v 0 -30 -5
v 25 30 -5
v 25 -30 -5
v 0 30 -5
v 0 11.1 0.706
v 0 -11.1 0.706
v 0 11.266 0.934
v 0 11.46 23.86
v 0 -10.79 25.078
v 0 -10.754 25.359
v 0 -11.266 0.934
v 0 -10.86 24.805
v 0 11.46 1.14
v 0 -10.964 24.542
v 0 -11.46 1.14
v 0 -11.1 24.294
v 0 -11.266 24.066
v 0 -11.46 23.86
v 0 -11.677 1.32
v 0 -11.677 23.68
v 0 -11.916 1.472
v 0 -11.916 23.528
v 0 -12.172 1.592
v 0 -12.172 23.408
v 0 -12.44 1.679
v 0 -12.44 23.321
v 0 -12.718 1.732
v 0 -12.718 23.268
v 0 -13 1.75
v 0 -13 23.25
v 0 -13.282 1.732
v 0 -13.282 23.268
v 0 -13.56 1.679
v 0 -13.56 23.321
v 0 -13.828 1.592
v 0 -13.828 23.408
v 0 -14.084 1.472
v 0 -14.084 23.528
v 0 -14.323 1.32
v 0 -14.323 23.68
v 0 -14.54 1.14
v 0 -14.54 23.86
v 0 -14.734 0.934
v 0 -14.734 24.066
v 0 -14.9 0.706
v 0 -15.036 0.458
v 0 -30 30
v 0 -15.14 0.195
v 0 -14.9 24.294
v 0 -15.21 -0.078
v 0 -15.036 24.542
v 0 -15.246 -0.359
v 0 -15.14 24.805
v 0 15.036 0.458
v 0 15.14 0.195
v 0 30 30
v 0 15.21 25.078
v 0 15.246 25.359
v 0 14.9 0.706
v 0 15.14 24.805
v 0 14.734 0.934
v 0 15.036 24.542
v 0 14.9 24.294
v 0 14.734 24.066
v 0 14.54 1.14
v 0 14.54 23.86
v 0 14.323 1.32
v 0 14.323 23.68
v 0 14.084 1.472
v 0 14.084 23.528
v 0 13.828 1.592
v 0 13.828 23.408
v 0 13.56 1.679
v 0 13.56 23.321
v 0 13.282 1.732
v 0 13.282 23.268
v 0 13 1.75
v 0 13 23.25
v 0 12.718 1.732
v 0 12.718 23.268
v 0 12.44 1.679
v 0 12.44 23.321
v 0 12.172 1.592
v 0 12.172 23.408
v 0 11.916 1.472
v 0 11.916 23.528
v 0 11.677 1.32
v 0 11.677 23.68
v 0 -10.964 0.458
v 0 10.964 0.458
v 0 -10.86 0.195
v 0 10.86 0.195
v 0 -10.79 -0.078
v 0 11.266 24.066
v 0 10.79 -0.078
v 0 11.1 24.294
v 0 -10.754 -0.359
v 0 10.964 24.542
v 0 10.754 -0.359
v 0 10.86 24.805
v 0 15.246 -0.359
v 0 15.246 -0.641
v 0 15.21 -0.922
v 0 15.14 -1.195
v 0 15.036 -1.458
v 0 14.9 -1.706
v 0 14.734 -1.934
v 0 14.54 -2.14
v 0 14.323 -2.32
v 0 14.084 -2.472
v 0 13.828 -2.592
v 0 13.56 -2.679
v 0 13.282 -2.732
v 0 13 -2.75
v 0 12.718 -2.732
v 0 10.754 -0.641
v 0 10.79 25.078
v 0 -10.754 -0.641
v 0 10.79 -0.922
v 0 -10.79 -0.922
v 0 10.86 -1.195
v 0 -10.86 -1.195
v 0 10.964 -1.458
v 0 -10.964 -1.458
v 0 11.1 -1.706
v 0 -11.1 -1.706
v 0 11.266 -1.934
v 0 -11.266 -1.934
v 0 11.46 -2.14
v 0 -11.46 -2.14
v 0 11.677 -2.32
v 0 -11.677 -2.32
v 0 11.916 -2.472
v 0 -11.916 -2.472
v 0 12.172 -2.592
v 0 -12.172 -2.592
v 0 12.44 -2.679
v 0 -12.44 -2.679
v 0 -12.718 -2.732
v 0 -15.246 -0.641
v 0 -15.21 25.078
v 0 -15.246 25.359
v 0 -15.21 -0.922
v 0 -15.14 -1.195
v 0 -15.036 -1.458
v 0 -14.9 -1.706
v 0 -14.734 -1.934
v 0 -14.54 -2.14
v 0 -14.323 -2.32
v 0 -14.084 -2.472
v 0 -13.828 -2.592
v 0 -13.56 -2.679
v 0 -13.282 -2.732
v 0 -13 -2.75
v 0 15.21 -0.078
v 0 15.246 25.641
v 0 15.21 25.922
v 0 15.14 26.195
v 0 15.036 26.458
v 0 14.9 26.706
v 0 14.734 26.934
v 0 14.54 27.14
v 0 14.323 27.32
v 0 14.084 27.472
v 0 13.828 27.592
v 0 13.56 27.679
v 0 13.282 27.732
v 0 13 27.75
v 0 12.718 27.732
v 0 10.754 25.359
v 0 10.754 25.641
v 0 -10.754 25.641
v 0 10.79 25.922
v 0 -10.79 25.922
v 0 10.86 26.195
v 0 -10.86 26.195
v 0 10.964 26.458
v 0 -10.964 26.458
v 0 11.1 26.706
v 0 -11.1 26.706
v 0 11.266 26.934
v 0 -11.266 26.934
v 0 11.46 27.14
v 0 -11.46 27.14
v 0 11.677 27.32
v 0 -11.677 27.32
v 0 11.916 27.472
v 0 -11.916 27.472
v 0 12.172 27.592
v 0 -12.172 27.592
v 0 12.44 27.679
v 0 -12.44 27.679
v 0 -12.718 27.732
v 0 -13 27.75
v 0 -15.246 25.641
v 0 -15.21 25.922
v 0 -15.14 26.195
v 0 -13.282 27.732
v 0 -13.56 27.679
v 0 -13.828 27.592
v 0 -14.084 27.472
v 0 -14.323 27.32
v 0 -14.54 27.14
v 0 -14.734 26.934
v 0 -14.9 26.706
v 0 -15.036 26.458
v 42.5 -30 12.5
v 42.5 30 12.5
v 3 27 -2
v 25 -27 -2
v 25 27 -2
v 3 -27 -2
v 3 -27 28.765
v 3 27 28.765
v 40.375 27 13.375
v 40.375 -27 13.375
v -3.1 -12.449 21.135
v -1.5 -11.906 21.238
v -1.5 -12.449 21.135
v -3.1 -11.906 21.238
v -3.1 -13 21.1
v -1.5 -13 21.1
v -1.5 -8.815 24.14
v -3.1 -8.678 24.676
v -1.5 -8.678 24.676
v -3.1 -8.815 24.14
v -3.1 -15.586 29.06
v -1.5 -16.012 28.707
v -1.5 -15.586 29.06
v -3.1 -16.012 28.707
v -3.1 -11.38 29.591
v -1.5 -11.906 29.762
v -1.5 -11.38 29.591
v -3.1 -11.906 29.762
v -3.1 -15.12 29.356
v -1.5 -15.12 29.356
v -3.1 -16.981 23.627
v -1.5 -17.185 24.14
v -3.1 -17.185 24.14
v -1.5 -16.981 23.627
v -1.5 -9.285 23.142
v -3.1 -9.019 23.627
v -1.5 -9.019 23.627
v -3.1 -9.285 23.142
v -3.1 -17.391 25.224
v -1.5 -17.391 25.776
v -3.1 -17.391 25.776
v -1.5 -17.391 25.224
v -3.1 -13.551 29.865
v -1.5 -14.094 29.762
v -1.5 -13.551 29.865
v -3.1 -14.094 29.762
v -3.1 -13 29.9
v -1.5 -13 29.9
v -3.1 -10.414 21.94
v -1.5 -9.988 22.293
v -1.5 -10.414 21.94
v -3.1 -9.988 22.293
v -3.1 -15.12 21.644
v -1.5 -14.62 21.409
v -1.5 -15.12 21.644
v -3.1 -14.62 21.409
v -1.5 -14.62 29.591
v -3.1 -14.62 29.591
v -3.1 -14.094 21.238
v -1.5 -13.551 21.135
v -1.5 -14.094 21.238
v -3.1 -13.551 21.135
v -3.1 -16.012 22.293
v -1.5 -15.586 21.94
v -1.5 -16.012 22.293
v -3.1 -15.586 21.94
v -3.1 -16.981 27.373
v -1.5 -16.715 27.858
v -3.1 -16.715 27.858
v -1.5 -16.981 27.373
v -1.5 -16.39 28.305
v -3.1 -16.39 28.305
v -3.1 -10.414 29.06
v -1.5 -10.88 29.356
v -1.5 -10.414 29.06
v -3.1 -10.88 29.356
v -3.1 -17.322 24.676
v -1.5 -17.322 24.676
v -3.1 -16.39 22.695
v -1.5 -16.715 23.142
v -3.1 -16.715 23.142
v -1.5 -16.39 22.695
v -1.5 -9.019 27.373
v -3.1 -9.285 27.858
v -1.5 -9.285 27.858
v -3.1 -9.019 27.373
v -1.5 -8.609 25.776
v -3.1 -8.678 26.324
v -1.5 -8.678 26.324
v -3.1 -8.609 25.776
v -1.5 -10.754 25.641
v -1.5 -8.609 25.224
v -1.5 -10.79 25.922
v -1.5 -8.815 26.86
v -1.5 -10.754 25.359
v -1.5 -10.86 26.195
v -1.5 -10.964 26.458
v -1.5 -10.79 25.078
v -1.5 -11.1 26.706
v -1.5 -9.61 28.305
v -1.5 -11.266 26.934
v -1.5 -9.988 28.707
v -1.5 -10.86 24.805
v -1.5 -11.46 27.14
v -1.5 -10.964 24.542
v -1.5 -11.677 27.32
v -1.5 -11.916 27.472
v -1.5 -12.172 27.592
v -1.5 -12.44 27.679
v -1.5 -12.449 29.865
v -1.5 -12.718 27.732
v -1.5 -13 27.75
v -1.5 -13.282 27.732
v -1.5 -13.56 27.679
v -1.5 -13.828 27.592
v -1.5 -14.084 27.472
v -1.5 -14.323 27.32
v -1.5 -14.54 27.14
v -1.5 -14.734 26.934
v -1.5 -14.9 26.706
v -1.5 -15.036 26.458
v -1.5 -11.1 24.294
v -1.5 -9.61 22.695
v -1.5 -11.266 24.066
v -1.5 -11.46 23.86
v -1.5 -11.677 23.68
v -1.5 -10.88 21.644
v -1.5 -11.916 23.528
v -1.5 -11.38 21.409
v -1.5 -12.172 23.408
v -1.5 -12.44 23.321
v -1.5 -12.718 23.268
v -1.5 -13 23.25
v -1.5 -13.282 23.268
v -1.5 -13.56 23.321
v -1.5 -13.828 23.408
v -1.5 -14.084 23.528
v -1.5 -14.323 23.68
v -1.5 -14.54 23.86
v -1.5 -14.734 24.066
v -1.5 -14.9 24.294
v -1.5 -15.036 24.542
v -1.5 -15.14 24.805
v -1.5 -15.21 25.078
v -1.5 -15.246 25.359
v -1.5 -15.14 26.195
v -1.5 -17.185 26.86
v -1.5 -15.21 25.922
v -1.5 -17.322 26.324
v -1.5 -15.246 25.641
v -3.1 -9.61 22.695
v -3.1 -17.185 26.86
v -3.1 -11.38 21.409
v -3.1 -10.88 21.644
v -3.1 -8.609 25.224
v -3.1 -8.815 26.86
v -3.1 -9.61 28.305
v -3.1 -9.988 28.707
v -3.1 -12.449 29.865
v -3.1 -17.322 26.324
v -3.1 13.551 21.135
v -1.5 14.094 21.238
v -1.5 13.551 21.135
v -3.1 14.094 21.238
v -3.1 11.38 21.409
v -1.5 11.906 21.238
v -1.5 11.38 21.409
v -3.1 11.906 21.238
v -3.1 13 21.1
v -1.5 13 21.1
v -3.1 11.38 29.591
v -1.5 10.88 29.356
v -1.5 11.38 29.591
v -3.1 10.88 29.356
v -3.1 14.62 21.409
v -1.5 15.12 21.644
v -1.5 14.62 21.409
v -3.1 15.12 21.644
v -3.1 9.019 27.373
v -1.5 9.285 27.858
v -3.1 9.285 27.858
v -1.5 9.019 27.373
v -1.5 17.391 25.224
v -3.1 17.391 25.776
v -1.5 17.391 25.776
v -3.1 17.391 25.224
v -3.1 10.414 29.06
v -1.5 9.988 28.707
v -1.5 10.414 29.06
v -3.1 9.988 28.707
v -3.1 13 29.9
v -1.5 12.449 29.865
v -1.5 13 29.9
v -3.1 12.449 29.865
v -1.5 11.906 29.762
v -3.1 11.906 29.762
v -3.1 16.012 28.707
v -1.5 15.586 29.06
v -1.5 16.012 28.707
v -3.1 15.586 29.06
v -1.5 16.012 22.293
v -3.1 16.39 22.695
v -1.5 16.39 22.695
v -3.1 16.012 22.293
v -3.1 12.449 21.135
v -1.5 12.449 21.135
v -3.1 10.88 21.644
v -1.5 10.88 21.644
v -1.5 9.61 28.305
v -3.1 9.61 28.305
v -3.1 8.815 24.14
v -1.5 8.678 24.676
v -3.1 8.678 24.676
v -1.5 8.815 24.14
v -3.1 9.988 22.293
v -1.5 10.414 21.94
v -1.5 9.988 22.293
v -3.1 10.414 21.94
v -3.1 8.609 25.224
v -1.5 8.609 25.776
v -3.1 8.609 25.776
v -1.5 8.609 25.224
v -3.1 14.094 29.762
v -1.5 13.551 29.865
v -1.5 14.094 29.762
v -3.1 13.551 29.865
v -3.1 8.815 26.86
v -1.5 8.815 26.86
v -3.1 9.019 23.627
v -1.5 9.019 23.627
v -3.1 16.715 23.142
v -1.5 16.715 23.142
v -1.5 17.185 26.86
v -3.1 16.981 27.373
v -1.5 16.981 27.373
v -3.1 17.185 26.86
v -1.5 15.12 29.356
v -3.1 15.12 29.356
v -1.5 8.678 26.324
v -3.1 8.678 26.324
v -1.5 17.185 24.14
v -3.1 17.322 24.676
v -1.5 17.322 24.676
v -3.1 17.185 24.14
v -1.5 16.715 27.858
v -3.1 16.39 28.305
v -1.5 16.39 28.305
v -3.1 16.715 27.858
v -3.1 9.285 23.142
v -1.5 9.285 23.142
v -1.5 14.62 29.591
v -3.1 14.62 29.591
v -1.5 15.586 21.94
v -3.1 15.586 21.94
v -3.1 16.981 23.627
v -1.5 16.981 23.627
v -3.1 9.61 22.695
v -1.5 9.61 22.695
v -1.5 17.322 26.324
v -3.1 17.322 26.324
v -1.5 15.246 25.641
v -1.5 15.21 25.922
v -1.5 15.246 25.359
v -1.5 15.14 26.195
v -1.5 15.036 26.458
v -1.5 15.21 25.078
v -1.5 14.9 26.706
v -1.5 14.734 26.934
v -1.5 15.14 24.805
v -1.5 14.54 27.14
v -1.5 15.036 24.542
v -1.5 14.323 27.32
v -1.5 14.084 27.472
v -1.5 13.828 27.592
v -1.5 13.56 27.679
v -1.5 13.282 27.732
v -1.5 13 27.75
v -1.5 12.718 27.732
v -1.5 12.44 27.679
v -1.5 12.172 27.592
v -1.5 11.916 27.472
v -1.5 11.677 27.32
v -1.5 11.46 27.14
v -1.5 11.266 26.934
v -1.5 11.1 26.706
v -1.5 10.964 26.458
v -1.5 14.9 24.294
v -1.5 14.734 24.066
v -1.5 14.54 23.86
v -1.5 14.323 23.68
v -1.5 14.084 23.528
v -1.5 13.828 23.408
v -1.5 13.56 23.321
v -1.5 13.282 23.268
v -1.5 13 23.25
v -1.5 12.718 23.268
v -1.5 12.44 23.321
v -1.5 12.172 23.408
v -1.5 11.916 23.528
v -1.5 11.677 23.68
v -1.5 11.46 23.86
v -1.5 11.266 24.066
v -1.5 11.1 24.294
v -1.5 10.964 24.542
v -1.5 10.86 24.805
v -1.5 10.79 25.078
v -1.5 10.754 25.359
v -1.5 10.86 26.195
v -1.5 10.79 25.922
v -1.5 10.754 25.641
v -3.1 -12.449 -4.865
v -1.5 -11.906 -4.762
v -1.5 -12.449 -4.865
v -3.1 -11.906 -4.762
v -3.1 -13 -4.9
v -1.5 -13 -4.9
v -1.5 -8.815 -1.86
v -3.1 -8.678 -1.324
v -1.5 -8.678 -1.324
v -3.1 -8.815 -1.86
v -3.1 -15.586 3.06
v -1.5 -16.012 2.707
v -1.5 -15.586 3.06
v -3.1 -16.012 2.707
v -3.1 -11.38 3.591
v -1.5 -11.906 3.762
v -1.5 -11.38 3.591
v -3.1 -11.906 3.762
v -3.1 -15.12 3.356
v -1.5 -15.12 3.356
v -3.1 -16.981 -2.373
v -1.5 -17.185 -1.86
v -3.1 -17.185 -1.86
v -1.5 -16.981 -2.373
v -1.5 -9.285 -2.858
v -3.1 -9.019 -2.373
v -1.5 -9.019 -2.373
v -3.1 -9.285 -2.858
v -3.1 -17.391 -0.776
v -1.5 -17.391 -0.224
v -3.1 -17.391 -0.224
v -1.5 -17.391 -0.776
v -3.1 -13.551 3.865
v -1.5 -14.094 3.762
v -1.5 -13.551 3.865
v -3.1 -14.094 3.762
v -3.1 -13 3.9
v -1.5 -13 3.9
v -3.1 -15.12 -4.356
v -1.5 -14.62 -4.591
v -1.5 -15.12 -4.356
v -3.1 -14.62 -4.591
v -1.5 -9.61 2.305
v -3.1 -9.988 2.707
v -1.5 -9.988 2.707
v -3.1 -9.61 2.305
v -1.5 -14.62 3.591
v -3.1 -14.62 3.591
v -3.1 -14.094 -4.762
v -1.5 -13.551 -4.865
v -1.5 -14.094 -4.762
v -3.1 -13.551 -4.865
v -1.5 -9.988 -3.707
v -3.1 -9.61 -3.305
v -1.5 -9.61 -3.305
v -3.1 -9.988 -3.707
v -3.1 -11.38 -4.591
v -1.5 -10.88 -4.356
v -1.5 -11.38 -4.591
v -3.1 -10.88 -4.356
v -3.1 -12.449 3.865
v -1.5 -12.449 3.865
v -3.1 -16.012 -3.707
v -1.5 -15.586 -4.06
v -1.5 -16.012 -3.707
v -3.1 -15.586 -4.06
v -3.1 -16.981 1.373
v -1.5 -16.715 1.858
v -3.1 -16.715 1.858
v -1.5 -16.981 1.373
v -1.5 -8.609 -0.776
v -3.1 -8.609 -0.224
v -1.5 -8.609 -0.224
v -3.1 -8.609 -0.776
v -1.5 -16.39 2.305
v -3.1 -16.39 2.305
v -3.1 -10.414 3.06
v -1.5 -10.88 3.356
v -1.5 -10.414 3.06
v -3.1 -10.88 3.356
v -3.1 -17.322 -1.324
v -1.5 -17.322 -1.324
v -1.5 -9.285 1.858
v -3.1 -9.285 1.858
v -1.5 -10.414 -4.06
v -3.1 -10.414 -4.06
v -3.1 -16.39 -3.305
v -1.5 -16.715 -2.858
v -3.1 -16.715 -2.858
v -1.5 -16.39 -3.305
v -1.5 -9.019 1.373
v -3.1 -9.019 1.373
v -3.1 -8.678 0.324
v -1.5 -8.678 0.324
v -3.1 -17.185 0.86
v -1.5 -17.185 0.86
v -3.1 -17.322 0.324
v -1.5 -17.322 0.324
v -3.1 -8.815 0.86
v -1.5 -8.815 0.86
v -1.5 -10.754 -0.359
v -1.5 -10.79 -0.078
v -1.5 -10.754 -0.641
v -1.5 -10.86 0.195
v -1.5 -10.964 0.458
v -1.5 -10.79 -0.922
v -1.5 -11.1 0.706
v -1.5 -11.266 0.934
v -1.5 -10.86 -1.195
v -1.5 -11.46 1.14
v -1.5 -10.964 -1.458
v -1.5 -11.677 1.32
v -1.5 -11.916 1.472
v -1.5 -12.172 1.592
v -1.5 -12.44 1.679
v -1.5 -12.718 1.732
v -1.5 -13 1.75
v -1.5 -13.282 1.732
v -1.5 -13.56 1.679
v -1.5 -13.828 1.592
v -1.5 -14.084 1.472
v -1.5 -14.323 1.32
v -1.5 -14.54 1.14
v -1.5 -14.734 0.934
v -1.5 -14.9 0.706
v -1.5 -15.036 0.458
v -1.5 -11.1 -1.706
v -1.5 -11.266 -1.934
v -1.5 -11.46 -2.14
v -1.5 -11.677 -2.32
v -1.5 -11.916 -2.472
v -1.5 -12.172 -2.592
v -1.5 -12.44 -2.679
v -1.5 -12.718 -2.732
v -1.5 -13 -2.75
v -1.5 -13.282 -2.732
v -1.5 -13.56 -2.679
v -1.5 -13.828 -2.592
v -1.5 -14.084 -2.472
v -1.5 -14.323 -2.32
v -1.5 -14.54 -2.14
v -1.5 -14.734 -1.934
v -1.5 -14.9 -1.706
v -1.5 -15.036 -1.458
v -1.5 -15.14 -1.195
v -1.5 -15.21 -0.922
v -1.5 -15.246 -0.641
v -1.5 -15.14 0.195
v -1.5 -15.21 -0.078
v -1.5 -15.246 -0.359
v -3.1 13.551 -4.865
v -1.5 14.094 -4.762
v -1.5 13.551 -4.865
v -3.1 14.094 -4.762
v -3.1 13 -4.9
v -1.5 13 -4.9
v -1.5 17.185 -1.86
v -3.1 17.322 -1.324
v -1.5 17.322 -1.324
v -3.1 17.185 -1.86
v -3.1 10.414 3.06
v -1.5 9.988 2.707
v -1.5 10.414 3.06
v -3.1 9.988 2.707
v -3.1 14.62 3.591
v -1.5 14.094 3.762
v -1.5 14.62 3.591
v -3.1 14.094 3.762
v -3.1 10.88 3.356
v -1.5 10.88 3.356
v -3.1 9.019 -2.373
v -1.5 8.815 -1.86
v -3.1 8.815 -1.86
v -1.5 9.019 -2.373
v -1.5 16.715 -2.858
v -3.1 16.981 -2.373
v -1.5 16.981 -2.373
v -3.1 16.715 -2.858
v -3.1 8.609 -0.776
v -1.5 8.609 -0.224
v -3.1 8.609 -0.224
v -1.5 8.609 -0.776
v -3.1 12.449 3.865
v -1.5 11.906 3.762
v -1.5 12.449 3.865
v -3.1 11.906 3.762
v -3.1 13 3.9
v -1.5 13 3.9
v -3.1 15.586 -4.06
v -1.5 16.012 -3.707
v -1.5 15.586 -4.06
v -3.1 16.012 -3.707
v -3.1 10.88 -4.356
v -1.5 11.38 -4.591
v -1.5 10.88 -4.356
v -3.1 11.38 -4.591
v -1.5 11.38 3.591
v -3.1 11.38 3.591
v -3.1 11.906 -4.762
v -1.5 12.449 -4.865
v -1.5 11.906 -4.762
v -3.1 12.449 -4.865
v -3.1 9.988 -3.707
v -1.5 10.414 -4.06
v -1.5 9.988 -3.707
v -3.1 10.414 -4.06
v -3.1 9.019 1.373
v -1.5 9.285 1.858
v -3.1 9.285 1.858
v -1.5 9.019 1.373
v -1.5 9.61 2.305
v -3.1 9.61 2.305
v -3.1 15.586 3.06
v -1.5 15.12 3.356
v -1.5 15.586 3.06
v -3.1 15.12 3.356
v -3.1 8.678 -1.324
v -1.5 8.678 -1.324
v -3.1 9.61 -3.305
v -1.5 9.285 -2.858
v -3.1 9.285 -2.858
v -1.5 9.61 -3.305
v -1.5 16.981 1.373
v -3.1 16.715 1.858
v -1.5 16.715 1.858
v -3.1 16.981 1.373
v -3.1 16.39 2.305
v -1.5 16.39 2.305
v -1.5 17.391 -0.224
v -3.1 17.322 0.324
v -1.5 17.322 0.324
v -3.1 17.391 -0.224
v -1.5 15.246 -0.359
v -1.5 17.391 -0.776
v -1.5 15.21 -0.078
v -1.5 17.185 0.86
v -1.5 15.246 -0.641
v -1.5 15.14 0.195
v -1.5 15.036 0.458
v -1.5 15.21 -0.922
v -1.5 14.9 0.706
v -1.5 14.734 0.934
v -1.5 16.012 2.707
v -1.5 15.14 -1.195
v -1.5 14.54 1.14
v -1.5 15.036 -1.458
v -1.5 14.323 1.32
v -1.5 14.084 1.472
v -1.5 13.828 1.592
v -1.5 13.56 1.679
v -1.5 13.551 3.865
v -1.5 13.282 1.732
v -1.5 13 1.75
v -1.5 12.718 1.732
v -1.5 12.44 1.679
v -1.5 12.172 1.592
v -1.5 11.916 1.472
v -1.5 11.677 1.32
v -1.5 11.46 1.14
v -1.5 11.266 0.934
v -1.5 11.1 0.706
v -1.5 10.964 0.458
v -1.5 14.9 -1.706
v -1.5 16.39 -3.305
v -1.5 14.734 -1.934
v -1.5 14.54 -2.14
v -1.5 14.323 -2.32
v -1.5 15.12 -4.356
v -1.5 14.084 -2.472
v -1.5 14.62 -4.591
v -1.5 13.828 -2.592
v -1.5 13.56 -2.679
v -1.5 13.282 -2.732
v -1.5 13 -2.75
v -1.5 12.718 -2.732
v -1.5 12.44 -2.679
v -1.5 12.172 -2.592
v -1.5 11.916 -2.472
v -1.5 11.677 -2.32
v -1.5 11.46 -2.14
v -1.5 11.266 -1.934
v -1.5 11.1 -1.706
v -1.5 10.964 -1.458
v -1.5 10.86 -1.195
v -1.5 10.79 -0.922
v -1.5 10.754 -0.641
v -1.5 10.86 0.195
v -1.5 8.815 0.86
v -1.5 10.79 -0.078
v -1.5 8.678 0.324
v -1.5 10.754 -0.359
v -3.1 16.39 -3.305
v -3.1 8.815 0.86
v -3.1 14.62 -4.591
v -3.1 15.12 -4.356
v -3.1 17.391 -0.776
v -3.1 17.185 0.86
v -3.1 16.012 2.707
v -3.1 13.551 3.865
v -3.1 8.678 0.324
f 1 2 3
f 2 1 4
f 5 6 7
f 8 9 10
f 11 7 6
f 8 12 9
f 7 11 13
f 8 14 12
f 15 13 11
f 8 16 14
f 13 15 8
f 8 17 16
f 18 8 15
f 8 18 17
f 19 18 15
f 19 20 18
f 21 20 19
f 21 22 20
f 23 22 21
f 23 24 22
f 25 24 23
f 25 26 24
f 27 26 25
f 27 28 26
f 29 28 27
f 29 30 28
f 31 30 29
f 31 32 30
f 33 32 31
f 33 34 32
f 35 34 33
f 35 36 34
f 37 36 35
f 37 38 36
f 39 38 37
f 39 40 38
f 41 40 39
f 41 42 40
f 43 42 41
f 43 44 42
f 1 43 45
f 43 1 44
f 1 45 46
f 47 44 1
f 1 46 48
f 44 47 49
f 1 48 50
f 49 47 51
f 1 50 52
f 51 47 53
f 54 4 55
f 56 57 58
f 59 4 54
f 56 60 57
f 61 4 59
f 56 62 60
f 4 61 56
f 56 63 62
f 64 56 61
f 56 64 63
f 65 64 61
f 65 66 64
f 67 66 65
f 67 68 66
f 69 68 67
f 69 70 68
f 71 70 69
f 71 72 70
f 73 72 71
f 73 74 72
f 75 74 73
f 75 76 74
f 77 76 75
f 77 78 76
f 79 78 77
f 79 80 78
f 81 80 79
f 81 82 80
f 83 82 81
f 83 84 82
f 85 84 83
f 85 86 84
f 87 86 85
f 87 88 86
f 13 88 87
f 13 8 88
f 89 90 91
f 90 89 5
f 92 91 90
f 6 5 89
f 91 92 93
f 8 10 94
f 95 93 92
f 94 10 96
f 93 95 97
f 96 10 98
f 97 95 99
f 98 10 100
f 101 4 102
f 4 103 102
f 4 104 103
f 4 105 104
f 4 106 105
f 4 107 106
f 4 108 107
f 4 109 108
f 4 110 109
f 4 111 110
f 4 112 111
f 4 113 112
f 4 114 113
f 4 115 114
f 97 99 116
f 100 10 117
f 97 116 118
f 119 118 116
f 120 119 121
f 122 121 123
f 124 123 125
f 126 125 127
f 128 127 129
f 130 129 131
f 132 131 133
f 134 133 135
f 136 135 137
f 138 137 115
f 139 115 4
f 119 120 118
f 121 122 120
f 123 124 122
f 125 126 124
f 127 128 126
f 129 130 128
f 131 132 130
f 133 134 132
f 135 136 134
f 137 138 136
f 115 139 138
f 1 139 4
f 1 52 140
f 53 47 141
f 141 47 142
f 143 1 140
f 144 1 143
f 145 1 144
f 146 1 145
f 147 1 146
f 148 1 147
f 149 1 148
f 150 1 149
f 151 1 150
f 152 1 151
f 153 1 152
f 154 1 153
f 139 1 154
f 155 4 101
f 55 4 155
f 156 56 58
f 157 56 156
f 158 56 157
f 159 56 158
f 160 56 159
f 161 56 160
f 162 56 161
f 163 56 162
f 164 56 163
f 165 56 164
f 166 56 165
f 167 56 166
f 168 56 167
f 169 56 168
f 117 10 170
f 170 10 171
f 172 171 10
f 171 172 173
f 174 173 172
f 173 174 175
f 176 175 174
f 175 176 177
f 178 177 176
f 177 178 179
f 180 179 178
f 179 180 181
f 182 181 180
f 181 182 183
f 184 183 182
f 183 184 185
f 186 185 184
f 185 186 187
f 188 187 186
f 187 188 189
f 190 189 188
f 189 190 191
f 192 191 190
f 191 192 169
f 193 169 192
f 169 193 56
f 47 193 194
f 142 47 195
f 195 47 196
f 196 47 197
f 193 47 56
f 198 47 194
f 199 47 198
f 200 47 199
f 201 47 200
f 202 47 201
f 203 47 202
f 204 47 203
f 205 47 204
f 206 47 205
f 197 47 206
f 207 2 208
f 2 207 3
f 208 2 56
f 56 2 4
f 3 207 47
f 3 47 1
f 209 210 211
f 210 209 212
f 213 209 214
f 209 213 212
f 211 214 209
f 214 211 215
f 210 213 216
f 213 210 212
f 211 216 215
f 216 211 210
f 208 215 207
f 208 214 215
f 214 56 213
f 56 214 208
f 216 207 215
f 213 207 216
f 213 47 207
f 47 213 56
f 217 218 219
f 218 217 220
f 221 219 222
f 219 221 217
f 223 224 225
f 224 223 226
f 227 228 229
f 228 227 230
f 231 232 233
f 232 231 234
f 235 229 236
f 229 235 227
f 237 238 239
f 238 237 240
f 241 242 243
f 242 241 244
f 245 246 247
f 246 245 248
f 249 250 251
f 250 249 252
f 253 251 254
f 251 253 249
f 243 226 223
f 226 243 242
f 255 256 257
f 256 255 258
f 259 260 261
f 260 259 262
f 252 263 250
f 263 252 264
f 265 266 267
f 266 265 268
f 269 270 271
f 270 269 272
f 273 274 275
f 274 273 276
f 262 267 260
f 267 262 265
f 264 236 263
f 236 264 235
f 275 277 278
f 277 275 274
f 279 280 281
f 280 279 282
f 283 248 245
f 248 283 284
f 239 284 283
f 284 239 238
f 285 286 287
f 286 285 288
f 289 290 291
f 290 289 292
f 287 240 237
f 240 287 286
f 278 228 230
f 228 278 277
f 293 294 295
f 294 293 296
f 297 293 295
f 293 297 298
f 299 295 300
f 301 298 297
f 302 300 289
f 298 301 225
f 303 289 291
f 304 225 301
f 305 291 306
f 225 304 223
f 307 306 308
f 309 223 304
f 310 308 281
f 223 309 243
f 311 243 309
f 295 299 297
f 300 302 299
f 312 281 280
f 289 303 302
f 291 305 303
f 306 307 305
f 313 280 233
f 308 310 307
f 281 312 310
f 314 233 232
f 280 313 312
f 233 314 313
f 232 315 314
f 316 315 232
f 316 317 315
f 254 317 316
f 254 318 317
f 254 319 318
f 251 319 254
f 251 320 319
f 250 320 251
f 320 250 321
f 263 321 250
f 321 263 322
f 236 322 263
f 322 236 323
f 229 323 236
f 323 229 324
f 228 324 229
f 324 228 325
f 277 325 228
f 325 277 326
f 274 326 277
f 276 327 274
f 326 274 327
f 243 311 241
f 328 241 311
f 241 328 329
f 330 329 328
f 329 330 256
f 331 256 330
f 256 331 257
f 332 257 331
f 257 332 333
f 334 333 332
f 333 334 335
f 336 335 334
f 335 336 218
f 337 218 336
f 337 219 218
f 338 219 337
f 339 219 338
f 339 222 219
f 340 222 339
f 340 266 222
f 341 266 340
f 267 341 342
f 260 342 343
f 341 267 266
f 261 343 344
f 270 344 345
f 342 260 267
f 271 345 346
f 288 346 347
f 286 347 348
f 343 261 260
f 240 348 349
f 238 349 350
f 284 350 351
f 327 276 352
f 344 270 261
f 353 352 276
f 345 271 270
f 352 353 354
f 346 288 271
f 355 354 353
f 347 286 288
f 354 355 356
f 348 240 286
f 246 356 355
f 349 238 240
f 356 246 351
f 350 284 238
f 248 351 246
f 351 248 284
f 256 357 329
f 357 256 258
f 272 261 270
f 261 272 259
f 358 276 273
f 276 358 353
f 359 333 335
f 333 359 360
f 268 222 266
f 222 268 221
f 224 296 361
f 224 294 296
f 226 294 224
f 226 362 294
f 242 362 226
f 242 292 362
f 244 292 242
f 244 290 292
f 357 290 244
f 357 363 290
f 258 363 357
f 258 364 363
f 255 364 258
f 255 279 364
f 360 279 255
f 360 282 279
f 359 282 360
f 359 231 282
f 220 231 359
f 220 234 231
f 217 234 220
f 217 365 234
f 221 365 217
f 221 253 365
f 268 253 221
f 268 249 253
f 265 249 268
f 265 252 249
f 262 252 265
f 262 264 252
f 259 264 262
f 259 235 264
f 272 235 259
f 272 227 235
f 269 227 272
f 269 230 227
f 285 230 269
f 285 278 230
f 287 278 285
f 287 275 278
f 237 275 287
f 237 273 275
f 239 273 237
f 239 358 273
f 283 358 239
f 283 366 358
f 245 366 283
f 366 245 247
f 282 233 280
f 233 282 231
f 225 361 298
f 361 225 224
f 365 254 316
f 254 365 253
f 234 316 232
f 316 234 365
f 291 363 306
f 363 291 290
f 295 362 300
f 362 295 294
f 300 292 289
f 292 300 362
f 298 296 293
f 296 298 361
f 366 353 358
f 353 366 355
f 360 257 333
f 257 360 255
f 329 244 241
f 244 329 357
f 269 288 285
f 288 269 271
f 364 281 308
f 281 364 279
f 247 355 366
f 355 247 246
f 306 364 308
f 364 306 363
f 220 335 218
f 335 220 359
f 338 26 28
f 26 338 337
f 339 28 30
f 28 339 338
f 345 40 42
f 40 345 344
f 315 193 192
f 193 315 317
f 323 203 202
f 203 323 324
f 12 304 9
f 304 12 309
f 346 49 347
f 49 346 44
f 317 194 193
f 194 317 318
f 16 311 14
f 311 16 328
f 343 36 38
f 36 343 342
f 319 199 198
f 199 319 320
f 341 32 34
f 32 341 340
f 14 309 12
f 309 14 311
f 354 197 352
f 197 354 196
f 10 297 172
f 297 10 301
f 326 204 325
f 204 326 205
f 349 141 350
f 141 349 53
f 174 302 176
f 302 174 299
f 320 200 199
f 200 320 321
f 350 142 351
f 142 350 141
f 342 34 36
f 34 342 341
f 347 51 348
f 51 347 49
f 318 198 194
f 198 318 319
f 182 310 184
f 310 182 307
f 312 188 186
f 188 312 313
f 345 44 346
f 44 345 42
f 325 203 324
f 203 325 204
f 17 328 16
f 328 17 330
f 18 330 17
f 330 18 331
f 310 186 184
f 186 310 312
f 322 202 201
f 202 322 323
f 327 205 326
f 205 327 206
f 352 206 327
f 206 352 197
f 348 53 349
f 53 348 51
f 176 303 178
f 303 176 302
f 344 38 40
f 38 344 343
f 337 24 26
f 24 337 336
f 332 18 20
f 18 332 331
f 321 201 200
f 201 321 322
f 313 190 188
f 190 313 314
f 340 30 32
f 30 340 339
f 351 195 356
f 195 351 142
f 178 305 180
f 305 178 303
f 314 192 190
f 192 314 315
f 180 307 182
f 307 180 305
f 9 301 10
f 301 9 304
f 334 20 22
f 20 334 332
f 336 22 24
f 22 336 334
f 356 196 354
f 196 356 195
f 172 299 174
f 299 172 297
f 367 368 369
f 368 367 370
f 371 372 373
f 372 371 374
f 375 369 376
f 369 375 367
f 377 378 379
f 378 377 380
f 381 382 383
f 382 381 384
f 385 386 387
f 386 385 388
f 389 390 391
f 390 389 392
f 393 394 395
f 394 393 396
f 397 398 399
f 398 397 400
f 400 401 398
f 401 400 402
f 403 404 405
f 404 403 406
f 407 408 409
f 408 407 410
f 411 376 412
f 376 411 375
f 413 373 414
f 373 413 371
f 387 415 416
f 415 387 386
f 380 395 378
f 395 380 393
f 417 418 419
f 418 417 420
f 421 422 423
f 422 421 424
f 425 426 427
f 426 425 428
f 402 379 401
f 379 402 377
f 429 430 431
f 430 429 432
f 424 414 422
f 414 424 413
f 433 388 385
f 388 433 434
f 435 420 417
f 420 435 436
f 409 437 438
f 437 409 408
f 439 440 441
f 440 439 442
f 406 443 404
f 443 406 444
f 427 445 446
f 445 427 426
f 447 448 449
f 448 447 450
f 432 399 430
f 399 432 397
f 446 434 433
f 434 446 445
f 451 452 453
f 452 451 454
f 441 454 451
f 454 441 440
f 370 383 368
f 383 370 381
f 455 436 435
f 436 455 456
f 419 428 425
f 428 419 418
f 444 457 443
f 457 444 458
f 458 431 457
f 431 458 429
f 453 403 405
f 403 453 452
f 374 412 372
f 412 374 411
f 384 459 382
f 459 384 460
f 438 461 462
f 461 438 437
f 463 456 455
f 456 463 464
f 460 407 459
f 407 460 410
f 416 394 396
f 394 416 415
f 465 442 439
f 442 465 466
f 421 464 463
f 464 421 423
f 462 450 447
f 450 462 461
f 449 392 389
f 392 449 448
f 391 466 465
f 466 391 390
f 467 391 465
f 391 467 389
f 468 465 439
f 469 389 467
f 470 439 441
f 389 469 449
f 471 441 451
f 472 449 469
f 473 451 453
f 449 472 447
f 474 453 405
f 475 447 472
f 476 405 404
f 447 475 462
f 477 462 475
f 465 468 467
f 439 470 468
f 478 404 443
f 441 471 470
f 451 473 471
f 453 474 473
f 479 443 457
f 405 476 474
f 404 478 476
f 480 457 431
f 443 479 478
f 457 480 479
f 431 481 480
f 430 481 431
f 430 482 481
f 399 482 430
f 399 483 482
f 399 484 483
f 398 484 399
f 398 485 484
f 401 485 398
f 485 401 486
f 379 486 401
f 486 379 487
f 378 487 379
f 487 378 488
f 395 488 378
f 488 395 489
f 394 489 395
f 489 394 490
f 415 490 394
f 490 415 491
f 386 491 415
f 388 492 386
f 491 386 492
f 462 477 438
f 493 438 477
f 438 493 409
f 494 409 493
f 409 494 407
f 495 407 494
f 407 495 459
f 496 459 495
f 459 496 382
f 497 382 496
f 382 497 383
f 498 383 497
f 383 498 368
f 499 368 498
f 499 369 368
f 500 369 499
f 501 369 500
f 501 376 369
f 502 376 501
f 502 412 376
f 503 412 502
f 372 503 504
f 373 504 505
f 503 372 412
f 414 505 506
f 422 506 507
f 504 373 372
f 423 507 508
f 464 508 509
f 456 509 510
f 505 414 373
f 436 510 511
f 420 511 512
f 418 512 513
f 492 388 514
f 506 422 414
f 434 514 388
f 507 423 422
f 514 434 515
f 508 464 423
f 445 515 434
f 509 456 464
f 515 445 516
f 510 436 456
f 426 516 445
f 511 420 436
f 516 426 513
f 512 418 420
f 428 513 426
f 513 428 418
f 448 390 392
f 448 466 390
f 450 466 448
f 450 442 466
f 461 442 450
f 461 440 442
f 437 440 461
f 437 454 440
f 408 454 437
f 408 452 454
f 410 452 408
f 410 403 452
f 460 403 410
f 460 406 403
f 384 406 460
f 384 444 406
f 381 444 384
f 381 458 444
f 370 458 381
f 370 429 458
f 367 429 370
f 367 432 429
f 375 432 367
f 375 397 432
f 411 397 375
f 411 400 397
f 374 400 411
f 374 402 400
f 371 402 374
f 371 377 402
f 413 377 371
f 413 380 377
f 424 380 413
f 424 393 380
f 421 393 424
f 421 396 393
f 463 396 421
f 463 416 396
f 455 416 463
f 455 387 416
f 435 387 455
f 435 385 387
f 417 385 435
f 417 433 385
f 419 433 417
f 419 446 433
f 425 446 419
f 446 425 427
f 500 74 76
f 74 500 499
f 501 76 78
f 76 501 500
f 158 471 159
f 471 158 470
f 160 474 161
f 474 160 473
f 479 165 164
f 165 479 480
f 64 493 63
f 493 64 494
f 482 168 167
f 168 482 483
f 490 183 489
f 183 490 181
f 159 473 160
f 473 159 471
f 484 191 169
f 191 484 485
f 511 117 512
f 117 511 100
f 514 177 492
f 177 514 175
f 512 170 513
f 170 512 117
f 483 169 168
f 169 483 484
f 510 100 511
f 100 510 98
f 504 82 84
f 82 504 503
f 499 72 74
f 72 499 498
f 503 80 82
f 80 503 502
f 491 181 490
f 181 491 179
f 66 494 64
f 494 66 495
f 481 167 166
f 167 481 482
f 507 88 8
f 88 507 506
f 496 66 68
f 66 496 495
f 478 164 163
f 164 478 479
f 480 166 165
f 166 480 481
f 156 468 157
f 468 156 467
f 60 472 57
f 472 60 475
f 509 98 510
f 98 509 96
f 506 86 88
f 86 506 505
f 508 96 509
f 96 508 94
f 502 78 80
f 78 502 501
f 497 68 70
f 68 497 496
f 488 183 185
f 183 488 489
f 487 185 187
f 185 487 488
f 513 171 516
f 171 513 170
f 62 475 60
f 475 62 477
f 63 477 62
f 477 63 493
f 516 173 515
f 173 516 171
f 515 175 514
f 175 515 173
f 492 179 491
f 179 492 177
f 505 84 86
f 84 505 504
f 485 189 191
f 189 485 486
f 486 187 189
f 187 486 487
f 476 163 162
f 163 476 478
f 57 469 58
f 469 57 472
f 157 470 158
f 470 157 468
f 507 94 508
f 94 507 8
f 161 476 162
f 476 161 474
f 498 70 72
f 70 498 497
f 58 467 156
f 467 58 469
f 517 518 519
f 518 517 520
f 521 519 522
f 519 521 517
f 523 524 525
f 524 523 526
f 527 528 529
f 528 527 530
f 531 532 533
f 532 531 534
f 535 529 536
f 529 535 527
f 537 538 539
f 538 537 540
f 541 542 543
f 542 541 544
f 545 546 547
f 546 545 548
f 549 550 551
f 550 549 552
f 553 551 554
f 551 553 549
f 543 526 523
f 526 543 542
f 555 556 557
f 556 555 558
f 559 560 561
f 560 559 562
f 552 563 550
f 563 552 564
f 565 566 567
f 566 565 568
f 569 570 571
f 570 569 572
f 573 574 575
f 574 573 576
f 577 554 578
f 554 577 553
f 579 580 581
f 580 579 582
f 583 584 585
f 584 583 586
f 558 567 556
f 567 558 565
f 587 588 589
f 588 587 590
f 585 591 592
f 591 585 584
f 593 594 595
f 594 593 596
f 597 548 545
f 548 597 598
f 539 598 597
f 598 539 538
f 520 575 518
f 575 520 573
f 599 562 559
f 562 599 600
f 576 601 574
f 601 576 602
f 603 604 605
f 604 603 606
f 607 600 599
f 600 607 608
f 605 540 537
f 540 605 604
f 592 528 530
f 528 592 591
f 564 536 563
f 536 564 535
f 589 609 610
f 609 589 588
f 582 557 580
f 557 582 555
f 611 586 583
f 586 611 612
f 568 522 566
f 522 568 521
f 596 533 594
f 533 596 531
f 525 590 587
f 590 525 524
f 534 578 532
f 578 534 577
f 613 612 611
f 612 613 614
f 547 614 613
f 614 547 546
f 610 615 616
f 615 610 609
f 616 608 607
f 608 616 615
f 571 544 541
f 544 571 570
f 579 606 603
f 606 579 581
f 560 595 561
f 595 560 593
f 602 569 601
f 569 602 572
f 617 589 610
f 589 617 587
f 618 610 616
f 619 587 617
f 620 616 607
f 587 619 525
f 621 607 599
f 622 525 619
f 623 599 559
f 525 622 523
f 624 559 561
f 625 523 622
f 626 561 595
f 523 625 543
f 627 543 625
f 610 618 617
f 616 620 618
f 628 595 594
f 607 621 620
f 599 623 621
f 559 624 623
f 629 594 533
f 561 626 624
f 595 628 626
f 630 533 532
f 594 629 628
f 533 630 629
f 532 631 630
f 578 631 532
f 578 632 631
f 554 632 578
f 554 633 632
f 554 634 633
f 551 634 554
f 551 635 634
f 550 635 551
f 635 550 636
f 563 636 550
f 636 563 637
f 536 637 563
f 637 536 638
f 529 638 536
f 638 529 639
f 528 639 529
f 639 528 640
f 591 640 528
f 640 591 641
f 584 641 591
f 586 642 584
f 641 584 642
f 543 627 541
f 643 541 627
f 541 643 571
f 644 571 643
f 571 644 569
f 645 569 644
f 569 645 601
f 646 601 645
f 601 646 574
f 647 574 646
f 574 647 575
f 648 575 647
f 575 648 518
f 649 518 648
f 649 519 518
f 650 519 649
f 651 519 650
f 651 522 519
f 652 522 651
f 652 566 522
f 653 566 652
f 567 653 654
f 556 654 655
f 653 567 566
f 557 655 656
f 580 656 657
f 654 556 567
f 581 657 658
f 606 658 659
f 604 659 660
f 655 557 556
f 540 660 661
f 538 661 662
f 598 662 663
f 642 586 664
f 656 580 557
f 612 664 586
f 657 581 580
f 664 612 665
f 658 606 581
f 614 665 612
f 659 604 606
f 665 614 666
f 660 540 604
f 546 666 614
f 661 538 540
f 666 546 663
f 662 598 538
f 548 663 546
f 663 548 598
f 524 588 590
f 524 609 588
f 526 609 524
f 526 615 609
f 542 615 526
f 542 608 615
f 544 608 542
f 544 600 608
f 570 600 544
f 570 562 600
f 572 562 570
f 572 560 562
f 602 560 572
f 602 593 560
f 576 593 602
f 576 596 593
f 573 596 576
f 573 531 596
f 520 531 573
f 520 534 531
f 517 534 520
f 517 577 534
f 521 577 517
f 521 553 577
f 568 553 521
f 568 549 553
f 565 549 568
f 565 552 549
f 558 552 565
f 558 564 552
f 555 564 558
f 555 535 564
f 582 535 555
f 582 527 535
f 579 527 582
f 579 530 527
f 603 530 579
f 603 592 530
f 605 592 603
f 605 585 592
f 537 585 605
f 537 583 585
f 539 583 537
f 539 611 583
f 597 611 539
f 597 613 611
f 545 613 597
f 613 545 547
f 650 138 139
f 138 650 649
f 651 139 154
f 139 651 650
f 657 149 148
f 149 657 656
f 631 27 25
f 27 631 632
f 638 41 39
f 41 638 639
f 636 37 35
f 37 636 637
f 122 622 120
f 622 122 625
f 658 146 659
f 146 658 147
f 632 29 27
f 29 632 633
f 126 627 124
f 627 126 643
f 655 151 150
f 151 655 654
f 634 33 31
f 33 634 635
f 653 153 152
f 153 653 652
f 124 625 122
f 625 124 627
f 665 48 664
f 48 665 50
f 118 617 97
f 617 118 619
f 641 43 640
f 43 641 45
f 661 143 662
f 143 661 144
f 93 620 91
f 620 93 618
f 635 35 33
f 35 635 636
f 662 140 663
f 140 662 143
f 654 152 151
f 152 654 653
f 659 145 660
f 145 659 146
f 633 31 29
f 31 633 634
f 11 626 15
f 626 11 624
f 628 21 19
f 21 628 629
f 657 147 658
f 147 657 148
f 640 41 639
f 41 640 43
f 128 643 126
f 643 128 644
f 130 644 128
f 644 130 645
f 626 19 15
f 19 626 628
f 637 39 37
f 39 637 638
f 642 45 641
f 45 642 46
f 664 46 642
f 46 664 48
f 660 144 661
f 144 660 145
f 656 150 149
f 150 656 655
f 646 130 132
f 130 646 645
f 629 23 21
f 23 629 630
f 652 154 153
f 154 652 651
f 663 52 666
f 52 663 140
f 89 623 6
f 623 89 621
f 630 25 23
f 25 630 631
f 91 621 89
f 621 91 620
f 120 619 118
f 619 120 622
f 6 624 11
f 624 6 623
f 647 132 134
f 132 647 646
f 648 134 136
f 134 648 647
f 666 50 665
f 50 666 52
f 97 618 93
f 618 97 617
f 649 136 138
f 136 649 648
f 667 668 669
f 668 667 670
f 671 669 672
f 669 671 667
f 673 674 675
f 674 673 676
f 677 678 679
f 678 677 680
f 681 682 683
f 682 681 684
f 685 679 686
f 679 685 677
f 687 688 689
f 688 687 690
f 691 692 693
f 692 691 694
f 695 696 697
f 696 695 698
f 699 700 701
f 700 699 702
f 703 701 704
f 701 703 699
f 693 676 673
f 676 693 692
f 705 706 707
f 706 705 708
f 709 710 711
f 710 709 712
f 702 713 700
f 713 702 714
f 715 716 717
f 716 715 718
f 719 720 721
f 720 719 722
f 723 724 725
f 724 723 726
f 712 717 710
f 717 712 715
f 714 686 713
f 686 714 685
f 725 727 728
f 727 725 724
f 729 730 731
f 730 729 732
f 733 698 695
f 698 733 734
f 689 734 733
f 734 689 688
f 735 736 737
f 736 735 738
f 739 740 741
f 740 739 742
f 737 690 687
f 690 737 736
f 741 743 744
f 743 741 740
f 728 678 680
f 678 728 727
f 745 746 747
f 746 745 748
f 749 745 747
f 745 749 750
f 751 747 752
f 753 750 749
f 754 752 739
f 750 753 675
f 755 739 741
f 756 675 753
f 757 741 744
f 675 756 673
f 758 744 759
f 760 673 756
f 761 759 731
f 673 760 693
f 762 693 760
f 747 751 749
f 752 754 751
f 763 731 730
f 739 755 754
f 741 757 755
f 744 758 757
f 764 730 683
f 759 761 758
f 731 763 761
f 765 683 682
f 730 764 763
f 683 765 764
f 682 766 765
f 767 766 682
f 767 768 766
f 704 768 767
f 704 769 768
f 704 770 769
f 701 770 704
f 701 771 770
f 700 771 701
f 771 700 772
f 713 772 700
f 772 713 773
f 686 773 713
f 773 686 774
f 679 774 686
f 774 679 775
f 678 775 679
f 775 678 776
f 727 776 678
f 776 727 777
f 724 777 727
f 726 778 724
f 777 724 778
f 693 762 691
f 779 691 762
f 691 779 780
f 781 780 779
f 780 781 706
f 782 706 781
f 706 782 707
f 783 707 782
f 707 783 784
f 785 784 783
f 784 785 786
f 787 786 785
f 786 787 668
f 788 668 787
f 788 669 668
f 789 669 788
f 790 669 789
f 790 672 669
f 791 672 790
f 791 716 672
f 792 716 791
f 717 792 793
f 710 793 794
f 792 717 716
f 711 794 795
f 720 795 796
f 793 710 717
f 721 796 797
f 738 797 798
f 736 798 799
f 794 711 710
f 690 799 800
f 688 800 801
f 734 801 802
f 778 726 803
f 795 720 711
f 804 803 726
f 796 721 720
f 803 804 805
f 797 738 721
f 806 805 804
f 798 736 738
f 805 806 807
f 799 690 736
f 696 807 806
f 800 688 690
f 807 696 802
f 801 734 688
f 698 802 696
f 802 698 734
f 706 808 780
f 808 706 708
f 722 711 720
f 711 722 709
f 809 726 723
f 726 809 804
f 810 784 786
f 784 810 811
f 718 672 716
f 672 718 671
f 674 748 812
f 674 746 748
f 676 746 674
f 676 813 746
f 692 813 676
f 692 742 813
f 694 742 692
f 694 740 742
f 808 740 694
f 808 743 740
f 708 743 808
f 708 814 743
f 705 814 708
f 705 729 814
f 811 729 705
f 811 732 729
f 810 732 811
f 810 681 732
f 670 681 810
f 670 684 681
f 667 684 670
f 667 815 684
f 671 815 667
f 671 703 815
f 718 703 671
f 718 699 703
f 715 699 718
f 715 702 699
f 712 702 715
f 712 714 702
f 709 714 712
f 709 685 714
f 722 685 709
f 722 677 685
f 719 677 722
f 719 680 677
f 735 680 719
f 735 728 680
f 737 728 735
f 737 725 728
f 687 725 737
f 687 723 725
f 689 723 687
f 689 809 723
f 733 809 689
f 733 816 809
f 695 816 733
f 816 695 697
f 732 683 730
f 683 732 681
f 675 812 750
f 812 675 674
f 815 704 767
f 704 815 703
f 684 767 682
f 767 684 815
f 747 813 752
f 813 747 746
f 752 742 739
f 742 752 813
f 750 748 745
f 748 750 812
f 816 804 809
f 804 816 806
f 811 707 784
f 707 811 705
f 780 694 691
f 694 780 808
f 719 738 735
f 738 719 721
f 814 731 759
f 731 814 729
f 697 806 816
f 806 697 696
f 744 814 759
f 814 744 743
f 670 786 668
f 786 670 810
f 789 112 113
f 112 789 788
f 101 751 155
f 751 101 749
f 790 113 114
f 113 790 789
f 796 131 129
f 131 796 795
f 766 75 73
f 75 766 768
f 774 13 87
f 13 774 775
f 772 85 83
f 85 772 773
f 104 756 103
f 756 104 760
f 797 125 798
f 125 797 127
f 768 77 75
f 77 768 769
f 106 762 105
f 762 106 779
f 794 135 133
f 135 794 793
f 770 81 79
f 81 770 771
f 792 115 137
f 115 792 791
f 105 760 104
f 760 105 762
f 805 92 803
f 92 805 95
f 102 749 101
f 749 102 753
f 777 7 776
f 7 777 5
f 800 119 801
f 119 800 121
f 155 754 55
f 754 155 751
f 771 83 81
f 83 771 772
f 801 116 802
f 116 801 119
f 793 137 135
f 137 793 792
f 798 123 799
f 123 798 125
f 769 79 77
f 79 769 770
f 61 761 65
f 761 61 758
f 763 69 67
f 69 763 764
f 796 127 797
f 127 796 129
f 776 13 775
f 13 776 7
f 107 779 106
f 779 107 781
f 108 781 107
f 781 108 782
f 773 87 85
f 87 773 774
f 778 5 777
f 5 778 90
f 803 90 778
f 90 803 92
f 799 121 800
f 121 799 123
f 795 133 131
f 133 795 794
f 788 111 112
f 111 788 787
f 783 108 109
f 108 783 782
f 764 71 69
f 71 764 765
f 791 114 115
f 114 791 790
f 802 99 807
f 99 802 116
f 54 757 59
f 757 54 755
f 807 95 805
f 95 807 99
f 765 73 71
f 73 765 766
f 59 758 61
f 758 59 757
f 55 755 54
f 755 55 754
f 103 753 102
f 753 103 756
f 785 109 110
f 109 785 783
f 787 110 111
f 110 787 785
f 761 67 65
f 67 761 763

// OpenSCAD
// file: base.scad
$fn=50;
eps=.1;


pinHolder(4,2);

module pinHolder(x,y) {
    pitch=26;
    
    translate([-pitch*(x-1)/2,-pitch*(y-1)/2,-3.6])
    for(i=[0:x-1]) {
        for(j=[0:y-1]) {            
            translate([pitch*i,pitch*j,0]) {
                linear_extrude(1.6) circle(d=8.8);
                translate([0,0,1.6]) linear_extrude(2) circle(d=4.5);    
            }
        }
    }
}
// main file
use <base.scad>

smooth = 50;
pegdiam = 5;
pegdepth = 2;
holespace = 25;
holespacediag = holespace+pegdiam*2;
d=sin(45)*holespacediag;
wall=3;

module pegboard(){
for ( i = [-2 : 2] ){
    for ( j = [-2 : 2] ){
color("BLUE"){
translate([0,i*holespace,j*holespace]){
//sphere([1,1,1]);
    
}
}
}

}
}
#pegboard();


module hook(){

translate([-0,0,pegdiam]){
difference(){
#rotate([90,0,0]){
rotate_extrude(convexity = 10, $fn = smooth)
translate([pegdiam, 0, 0])
circle(d = pegdiam, $fn = smooth);
}
translate([pegdiam,0,0]){
    cube([pegdiam*2,pegdiam,pegdiam*3], center=true);
}
translate([0,0,pegdiam]){
    cube([pegdiam*3,pegdiam,pegdiam*2], center=true);
}

}
translate([-pegdiam,0,0]){
#sphere(d=pegdiam,$fn = smooth);
}


}
}
module lowpeg(){
    
    translate([0,0,0]){
rotate([0,90,0]){
cylinder(d=pegdiam,h=pegdepth,$fn = smooth);
}
}

}
/*
translate([0,holespace,holespace]){
hook();
}

translate([0,-holespace,holespace]){
hook();
}

translate([0,0,holespace]){
hook();
}

translate([-pegdepth,0,0]){
lowpeg();
}

 
translate([-pegdepth,holespace,0]){
lowpeg();
}

translate([-pegdepth,-holespace,0]){
lowpeg();
}
*/

difference(){
hull() {
translate([0,-holespace-pegdiam,-pegdiam]){
cube([holespace,(holespace+pegdiam)*2,holespace+pegdiam*2]);
}

color("BLUE"){
translate([holespace*0.3,-holespace-pegdiam,holespace/2]){
rotate([0,45,0]){
cube([d,(holespace+pegdiam)*2,d]);
}
}
}
}

translate([wall,-holespace-pegdiam+wall,-pegdiam+wall]){
    cube([holespace-wall,((holespace+pegdiam)*2)-(wall*2),holespace+pegdiam*2]);
}
translate([(holespace)*0.3,-holespace-pegdiam+wall,(holespace/2)+wall]){
rotate([0,45,0]){
    cube([d,((holespace+pegdiam)*2)-(wall*2),d]);
}
}

translate([0,-holespace-pegdiam-2,holespace+pegdiam]){
    rotate([0,22.38,0]){
        cube([holespace*2,((holespace+pegdiam)*2)+3,holespace]);
}
}



}
//
//polyhedron(
//  points=[  [0,-holespace-pegdiam,holespace+pegdiam], //0
//            [0,holespace+pegdiam,holespace+pegdiam], //1
//            [holespace*2,holespace+pegdiam,holespace+pegdiam], //2
//            [holespace*2,-holespace-pegdiam,holespace+pegdiam], //3
//            [0,-holespace-pegdiam,-pegdiam], //4
//            [holespace,-holespace-pegdiam,-pegdiam], //5
//            [0,holespace+pegdiam,-pegdiam], //6
//            [holespace,holespace+pegdiam,-pegdiam] //7
//  ],                                 // the apex point 
//  faces=[ [0,1,2,3],
//          [0,3,5,4],
//          [1,2,7,6], 
//          [4,5,7,6], 
//          [4,5,7,6],
//          [2,3,5,7],
//          [0,1,6,4],
//
//]                  // two triangles for square base
// );



color("BLUE"){
translate([0,holespace+pegdiam,-pegdiam]){
//sphere([1,1,1]);
    
}
}

translate([.5,0,12.5]) rotate([0,90,0]) #pinHolder(2,2);
